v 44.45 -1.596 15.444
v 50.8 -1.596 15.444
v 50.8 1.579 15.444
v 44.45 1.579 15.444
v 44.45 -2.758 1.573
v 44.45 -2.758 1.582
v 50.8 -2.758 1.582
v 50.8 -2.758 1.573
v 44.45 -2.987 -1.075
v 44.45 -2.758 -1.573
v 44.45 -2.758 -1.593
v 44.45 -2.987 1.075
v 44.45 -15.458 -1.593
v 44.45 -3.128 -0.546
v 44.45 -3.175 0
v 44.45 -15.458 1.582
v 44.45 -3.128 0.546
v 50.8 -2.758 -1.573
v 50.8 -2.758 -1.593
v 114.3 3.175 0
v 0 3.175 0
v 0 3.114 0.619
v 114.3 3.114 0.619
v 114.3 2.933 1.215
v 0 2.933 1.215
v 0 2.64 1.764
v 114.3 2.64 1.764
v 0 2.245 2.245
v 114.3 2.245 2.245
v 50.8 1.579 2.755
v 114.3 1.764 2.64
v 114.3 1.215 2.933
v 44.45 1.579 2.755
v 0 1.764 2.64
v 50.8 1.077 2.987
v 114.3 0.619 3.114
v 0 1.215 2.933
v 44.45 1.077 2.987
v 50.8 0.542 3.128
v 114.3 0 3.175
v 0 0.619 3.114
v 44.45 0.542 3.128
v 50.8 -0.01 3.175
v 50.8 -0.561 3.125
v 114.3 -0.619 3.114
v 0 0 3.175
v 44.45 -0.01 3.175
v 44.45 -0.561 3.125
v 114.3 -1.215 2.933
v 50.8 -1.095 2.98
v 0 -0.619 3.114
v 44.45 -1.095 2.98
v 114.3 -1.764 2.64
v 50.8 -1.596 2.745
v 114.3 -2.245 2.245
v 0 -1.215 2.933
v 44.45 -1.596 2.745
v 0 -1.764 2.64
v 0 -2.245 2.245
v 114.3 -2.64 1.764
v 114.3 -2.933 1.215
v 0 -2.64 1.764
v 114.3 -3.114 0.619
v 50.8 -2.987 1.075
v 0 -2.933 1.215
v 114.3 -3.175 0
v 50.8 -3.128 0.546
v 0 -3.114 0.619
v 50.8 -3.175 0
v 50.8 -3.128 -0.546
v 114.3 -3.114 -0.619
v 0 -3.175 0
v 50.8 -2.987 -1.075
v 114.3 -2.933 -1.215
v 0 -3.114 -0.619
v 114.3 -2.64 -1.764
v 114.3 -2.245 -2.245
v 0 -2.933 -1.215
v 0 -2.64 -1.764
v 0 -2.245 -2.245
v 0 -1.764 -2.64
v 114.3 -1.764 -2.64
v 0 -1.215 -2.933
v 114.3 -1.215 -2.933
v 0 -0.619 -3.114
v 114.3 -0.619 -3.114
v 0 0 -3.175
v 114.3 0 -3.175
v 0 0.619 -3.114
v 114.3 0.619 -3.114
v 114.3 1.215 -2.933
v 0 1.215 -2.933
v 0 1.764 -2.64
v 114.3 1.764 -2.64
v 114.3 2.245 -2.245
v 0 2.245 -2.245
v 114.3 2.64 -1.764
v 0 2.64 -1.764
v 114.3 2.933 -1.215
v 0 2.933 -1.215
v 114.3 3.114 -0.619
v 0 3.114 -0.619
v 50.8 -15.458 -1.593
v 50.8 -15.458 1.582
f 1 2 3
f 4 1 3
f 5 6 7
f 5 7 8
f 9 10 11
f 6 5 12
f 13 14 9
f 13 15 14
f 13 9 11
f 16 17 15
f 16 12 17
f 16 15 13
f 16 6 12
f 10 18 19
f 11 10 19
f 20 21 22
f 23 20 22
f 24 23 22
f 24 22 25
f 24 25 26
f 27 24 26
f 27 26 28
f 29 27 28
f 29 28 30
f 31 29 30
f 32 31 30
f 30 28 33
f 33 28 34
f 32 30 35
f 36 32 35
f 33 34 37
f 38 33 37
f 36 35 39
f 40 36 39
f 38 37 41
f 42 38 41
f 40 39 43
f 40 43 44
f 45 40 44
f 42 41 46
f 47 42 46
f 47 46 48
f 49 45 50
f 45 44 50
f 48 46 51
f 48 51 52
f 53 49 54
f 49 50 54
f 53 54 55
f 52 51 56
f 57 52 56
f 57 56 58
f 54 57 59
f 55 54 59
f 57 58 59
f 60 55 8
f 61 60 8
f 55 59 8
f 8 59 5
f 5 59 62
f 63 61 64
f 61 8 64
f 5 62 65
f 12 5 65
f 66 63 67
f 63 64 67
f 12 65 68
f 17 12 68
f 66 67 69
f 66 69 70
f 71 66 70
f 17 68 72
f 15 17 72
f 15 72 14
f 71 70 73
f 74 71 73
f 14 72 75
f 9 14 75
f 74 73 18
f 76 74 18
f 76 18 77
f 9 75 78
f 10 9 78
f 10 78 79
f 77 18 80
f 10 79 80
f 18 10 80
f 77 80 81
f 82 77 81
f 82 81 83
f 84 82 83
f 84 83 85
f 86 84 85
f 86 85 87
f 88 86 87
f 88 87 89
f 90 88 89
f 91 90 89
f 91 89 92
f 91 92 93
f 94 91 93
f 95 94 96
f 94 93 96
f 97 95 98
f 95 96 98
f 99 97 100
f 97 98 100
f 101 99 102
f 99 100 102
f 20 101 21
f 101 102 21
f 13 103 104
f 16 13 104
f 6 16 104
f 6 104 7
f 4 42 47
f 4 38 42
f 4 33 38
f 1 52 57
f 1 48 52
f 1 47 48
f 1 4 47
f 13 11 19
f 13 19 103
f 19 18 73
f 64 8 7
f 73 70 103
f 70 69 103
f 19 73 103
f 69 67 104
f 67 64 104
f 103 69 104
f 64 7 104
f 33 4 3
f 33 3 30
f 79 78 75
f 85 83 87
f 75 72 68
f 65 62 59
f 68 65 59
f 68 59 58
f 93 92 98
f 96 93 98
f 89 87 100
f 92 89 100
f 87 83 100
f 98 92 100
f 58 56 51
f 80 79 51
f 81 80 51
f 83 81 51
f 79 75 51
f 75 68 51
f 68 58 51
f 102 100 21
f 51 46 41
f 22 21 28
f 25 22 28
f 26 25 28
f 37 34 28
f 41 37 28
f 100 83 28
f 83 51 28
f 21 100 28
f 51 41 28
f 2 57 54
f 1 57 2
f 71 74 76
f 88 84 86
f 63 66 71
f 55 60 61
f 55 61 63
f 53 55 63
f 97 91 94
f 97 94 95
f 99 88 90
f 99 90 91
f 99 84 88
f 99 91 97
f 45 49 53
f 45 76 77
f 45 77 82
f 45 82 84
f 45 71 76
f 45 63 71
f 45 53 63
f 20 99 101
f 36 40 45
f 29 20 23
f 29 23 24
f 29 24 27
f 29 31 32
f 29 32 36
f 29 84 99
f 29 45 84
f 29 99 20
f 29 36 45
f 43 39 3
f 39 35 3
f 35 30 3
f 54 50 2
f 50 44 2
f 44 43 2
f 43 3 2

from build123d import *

# Parameters (mm, degrees)
F0_R     = 3.175
F1_DEPTH = 114.3
F5_DEPTH = 6.35


with BuildPart() as f1:
    # F0 (on Right) → F1 (new body)
    with BuildSketch(Plane.YZ):
        Circle(F0_R)
    extrude(amount=F1_DEPTH)

    # F4 (on offset) → F5 (join)
    with BuildSketch(Plane(origin=(44.45, 0, 0), x_dir=(0, -1, 0), z_dir=(-1, 0, 0))):
        with BuildLine():
            Line((15.4581812469, 1.5823668619), (2.7581812469, 1.5823668619))
            Line((2.7581812469, 1.5823668619), (2.7581812469, 1.571402878))
            ThreePointArc((2.7581812469, 1.571402878), (3.0685880653, 0.8127964573), (3.1744087316, 0))
            ThreePointArc((3.1744087316, 0), (3.0685880653, -0.8127964573), (2.7581812469, -1.571402878))
            Line((2.7581812469, -1.571402878), (2.7581812469, -1.5926331381))
            Line((2.7581812469, -1.5926331381), (15.4581812469, -1.5926331381))
            Line((15.4581812469, -1.5926331381), (15.4581812469, 1.5823668619))
        make_face()
        with BuildLine():
            ThreePointArc((-1.5789494102, 2.7538681079), (0.0093713682, 3.1743948987), (1.5951815458, 2.7444975189))
            Line((1.5951815458, 2.7444975189), (1.5960505898, 2.7444975189))
            Line((1.5960505898, 2.7444975189), (1.5960505898, 15.4444975189))
            Line((1.5960505898, 15.4444975189), (-1.5789494102, 15.4444975189))
            Line((-1.5789494102, 15.4444975189), (-1.5789494102, 2.7538681079))
        make_face()
    extrude(amount=-F5_DEPTH)


solid = f1.part
